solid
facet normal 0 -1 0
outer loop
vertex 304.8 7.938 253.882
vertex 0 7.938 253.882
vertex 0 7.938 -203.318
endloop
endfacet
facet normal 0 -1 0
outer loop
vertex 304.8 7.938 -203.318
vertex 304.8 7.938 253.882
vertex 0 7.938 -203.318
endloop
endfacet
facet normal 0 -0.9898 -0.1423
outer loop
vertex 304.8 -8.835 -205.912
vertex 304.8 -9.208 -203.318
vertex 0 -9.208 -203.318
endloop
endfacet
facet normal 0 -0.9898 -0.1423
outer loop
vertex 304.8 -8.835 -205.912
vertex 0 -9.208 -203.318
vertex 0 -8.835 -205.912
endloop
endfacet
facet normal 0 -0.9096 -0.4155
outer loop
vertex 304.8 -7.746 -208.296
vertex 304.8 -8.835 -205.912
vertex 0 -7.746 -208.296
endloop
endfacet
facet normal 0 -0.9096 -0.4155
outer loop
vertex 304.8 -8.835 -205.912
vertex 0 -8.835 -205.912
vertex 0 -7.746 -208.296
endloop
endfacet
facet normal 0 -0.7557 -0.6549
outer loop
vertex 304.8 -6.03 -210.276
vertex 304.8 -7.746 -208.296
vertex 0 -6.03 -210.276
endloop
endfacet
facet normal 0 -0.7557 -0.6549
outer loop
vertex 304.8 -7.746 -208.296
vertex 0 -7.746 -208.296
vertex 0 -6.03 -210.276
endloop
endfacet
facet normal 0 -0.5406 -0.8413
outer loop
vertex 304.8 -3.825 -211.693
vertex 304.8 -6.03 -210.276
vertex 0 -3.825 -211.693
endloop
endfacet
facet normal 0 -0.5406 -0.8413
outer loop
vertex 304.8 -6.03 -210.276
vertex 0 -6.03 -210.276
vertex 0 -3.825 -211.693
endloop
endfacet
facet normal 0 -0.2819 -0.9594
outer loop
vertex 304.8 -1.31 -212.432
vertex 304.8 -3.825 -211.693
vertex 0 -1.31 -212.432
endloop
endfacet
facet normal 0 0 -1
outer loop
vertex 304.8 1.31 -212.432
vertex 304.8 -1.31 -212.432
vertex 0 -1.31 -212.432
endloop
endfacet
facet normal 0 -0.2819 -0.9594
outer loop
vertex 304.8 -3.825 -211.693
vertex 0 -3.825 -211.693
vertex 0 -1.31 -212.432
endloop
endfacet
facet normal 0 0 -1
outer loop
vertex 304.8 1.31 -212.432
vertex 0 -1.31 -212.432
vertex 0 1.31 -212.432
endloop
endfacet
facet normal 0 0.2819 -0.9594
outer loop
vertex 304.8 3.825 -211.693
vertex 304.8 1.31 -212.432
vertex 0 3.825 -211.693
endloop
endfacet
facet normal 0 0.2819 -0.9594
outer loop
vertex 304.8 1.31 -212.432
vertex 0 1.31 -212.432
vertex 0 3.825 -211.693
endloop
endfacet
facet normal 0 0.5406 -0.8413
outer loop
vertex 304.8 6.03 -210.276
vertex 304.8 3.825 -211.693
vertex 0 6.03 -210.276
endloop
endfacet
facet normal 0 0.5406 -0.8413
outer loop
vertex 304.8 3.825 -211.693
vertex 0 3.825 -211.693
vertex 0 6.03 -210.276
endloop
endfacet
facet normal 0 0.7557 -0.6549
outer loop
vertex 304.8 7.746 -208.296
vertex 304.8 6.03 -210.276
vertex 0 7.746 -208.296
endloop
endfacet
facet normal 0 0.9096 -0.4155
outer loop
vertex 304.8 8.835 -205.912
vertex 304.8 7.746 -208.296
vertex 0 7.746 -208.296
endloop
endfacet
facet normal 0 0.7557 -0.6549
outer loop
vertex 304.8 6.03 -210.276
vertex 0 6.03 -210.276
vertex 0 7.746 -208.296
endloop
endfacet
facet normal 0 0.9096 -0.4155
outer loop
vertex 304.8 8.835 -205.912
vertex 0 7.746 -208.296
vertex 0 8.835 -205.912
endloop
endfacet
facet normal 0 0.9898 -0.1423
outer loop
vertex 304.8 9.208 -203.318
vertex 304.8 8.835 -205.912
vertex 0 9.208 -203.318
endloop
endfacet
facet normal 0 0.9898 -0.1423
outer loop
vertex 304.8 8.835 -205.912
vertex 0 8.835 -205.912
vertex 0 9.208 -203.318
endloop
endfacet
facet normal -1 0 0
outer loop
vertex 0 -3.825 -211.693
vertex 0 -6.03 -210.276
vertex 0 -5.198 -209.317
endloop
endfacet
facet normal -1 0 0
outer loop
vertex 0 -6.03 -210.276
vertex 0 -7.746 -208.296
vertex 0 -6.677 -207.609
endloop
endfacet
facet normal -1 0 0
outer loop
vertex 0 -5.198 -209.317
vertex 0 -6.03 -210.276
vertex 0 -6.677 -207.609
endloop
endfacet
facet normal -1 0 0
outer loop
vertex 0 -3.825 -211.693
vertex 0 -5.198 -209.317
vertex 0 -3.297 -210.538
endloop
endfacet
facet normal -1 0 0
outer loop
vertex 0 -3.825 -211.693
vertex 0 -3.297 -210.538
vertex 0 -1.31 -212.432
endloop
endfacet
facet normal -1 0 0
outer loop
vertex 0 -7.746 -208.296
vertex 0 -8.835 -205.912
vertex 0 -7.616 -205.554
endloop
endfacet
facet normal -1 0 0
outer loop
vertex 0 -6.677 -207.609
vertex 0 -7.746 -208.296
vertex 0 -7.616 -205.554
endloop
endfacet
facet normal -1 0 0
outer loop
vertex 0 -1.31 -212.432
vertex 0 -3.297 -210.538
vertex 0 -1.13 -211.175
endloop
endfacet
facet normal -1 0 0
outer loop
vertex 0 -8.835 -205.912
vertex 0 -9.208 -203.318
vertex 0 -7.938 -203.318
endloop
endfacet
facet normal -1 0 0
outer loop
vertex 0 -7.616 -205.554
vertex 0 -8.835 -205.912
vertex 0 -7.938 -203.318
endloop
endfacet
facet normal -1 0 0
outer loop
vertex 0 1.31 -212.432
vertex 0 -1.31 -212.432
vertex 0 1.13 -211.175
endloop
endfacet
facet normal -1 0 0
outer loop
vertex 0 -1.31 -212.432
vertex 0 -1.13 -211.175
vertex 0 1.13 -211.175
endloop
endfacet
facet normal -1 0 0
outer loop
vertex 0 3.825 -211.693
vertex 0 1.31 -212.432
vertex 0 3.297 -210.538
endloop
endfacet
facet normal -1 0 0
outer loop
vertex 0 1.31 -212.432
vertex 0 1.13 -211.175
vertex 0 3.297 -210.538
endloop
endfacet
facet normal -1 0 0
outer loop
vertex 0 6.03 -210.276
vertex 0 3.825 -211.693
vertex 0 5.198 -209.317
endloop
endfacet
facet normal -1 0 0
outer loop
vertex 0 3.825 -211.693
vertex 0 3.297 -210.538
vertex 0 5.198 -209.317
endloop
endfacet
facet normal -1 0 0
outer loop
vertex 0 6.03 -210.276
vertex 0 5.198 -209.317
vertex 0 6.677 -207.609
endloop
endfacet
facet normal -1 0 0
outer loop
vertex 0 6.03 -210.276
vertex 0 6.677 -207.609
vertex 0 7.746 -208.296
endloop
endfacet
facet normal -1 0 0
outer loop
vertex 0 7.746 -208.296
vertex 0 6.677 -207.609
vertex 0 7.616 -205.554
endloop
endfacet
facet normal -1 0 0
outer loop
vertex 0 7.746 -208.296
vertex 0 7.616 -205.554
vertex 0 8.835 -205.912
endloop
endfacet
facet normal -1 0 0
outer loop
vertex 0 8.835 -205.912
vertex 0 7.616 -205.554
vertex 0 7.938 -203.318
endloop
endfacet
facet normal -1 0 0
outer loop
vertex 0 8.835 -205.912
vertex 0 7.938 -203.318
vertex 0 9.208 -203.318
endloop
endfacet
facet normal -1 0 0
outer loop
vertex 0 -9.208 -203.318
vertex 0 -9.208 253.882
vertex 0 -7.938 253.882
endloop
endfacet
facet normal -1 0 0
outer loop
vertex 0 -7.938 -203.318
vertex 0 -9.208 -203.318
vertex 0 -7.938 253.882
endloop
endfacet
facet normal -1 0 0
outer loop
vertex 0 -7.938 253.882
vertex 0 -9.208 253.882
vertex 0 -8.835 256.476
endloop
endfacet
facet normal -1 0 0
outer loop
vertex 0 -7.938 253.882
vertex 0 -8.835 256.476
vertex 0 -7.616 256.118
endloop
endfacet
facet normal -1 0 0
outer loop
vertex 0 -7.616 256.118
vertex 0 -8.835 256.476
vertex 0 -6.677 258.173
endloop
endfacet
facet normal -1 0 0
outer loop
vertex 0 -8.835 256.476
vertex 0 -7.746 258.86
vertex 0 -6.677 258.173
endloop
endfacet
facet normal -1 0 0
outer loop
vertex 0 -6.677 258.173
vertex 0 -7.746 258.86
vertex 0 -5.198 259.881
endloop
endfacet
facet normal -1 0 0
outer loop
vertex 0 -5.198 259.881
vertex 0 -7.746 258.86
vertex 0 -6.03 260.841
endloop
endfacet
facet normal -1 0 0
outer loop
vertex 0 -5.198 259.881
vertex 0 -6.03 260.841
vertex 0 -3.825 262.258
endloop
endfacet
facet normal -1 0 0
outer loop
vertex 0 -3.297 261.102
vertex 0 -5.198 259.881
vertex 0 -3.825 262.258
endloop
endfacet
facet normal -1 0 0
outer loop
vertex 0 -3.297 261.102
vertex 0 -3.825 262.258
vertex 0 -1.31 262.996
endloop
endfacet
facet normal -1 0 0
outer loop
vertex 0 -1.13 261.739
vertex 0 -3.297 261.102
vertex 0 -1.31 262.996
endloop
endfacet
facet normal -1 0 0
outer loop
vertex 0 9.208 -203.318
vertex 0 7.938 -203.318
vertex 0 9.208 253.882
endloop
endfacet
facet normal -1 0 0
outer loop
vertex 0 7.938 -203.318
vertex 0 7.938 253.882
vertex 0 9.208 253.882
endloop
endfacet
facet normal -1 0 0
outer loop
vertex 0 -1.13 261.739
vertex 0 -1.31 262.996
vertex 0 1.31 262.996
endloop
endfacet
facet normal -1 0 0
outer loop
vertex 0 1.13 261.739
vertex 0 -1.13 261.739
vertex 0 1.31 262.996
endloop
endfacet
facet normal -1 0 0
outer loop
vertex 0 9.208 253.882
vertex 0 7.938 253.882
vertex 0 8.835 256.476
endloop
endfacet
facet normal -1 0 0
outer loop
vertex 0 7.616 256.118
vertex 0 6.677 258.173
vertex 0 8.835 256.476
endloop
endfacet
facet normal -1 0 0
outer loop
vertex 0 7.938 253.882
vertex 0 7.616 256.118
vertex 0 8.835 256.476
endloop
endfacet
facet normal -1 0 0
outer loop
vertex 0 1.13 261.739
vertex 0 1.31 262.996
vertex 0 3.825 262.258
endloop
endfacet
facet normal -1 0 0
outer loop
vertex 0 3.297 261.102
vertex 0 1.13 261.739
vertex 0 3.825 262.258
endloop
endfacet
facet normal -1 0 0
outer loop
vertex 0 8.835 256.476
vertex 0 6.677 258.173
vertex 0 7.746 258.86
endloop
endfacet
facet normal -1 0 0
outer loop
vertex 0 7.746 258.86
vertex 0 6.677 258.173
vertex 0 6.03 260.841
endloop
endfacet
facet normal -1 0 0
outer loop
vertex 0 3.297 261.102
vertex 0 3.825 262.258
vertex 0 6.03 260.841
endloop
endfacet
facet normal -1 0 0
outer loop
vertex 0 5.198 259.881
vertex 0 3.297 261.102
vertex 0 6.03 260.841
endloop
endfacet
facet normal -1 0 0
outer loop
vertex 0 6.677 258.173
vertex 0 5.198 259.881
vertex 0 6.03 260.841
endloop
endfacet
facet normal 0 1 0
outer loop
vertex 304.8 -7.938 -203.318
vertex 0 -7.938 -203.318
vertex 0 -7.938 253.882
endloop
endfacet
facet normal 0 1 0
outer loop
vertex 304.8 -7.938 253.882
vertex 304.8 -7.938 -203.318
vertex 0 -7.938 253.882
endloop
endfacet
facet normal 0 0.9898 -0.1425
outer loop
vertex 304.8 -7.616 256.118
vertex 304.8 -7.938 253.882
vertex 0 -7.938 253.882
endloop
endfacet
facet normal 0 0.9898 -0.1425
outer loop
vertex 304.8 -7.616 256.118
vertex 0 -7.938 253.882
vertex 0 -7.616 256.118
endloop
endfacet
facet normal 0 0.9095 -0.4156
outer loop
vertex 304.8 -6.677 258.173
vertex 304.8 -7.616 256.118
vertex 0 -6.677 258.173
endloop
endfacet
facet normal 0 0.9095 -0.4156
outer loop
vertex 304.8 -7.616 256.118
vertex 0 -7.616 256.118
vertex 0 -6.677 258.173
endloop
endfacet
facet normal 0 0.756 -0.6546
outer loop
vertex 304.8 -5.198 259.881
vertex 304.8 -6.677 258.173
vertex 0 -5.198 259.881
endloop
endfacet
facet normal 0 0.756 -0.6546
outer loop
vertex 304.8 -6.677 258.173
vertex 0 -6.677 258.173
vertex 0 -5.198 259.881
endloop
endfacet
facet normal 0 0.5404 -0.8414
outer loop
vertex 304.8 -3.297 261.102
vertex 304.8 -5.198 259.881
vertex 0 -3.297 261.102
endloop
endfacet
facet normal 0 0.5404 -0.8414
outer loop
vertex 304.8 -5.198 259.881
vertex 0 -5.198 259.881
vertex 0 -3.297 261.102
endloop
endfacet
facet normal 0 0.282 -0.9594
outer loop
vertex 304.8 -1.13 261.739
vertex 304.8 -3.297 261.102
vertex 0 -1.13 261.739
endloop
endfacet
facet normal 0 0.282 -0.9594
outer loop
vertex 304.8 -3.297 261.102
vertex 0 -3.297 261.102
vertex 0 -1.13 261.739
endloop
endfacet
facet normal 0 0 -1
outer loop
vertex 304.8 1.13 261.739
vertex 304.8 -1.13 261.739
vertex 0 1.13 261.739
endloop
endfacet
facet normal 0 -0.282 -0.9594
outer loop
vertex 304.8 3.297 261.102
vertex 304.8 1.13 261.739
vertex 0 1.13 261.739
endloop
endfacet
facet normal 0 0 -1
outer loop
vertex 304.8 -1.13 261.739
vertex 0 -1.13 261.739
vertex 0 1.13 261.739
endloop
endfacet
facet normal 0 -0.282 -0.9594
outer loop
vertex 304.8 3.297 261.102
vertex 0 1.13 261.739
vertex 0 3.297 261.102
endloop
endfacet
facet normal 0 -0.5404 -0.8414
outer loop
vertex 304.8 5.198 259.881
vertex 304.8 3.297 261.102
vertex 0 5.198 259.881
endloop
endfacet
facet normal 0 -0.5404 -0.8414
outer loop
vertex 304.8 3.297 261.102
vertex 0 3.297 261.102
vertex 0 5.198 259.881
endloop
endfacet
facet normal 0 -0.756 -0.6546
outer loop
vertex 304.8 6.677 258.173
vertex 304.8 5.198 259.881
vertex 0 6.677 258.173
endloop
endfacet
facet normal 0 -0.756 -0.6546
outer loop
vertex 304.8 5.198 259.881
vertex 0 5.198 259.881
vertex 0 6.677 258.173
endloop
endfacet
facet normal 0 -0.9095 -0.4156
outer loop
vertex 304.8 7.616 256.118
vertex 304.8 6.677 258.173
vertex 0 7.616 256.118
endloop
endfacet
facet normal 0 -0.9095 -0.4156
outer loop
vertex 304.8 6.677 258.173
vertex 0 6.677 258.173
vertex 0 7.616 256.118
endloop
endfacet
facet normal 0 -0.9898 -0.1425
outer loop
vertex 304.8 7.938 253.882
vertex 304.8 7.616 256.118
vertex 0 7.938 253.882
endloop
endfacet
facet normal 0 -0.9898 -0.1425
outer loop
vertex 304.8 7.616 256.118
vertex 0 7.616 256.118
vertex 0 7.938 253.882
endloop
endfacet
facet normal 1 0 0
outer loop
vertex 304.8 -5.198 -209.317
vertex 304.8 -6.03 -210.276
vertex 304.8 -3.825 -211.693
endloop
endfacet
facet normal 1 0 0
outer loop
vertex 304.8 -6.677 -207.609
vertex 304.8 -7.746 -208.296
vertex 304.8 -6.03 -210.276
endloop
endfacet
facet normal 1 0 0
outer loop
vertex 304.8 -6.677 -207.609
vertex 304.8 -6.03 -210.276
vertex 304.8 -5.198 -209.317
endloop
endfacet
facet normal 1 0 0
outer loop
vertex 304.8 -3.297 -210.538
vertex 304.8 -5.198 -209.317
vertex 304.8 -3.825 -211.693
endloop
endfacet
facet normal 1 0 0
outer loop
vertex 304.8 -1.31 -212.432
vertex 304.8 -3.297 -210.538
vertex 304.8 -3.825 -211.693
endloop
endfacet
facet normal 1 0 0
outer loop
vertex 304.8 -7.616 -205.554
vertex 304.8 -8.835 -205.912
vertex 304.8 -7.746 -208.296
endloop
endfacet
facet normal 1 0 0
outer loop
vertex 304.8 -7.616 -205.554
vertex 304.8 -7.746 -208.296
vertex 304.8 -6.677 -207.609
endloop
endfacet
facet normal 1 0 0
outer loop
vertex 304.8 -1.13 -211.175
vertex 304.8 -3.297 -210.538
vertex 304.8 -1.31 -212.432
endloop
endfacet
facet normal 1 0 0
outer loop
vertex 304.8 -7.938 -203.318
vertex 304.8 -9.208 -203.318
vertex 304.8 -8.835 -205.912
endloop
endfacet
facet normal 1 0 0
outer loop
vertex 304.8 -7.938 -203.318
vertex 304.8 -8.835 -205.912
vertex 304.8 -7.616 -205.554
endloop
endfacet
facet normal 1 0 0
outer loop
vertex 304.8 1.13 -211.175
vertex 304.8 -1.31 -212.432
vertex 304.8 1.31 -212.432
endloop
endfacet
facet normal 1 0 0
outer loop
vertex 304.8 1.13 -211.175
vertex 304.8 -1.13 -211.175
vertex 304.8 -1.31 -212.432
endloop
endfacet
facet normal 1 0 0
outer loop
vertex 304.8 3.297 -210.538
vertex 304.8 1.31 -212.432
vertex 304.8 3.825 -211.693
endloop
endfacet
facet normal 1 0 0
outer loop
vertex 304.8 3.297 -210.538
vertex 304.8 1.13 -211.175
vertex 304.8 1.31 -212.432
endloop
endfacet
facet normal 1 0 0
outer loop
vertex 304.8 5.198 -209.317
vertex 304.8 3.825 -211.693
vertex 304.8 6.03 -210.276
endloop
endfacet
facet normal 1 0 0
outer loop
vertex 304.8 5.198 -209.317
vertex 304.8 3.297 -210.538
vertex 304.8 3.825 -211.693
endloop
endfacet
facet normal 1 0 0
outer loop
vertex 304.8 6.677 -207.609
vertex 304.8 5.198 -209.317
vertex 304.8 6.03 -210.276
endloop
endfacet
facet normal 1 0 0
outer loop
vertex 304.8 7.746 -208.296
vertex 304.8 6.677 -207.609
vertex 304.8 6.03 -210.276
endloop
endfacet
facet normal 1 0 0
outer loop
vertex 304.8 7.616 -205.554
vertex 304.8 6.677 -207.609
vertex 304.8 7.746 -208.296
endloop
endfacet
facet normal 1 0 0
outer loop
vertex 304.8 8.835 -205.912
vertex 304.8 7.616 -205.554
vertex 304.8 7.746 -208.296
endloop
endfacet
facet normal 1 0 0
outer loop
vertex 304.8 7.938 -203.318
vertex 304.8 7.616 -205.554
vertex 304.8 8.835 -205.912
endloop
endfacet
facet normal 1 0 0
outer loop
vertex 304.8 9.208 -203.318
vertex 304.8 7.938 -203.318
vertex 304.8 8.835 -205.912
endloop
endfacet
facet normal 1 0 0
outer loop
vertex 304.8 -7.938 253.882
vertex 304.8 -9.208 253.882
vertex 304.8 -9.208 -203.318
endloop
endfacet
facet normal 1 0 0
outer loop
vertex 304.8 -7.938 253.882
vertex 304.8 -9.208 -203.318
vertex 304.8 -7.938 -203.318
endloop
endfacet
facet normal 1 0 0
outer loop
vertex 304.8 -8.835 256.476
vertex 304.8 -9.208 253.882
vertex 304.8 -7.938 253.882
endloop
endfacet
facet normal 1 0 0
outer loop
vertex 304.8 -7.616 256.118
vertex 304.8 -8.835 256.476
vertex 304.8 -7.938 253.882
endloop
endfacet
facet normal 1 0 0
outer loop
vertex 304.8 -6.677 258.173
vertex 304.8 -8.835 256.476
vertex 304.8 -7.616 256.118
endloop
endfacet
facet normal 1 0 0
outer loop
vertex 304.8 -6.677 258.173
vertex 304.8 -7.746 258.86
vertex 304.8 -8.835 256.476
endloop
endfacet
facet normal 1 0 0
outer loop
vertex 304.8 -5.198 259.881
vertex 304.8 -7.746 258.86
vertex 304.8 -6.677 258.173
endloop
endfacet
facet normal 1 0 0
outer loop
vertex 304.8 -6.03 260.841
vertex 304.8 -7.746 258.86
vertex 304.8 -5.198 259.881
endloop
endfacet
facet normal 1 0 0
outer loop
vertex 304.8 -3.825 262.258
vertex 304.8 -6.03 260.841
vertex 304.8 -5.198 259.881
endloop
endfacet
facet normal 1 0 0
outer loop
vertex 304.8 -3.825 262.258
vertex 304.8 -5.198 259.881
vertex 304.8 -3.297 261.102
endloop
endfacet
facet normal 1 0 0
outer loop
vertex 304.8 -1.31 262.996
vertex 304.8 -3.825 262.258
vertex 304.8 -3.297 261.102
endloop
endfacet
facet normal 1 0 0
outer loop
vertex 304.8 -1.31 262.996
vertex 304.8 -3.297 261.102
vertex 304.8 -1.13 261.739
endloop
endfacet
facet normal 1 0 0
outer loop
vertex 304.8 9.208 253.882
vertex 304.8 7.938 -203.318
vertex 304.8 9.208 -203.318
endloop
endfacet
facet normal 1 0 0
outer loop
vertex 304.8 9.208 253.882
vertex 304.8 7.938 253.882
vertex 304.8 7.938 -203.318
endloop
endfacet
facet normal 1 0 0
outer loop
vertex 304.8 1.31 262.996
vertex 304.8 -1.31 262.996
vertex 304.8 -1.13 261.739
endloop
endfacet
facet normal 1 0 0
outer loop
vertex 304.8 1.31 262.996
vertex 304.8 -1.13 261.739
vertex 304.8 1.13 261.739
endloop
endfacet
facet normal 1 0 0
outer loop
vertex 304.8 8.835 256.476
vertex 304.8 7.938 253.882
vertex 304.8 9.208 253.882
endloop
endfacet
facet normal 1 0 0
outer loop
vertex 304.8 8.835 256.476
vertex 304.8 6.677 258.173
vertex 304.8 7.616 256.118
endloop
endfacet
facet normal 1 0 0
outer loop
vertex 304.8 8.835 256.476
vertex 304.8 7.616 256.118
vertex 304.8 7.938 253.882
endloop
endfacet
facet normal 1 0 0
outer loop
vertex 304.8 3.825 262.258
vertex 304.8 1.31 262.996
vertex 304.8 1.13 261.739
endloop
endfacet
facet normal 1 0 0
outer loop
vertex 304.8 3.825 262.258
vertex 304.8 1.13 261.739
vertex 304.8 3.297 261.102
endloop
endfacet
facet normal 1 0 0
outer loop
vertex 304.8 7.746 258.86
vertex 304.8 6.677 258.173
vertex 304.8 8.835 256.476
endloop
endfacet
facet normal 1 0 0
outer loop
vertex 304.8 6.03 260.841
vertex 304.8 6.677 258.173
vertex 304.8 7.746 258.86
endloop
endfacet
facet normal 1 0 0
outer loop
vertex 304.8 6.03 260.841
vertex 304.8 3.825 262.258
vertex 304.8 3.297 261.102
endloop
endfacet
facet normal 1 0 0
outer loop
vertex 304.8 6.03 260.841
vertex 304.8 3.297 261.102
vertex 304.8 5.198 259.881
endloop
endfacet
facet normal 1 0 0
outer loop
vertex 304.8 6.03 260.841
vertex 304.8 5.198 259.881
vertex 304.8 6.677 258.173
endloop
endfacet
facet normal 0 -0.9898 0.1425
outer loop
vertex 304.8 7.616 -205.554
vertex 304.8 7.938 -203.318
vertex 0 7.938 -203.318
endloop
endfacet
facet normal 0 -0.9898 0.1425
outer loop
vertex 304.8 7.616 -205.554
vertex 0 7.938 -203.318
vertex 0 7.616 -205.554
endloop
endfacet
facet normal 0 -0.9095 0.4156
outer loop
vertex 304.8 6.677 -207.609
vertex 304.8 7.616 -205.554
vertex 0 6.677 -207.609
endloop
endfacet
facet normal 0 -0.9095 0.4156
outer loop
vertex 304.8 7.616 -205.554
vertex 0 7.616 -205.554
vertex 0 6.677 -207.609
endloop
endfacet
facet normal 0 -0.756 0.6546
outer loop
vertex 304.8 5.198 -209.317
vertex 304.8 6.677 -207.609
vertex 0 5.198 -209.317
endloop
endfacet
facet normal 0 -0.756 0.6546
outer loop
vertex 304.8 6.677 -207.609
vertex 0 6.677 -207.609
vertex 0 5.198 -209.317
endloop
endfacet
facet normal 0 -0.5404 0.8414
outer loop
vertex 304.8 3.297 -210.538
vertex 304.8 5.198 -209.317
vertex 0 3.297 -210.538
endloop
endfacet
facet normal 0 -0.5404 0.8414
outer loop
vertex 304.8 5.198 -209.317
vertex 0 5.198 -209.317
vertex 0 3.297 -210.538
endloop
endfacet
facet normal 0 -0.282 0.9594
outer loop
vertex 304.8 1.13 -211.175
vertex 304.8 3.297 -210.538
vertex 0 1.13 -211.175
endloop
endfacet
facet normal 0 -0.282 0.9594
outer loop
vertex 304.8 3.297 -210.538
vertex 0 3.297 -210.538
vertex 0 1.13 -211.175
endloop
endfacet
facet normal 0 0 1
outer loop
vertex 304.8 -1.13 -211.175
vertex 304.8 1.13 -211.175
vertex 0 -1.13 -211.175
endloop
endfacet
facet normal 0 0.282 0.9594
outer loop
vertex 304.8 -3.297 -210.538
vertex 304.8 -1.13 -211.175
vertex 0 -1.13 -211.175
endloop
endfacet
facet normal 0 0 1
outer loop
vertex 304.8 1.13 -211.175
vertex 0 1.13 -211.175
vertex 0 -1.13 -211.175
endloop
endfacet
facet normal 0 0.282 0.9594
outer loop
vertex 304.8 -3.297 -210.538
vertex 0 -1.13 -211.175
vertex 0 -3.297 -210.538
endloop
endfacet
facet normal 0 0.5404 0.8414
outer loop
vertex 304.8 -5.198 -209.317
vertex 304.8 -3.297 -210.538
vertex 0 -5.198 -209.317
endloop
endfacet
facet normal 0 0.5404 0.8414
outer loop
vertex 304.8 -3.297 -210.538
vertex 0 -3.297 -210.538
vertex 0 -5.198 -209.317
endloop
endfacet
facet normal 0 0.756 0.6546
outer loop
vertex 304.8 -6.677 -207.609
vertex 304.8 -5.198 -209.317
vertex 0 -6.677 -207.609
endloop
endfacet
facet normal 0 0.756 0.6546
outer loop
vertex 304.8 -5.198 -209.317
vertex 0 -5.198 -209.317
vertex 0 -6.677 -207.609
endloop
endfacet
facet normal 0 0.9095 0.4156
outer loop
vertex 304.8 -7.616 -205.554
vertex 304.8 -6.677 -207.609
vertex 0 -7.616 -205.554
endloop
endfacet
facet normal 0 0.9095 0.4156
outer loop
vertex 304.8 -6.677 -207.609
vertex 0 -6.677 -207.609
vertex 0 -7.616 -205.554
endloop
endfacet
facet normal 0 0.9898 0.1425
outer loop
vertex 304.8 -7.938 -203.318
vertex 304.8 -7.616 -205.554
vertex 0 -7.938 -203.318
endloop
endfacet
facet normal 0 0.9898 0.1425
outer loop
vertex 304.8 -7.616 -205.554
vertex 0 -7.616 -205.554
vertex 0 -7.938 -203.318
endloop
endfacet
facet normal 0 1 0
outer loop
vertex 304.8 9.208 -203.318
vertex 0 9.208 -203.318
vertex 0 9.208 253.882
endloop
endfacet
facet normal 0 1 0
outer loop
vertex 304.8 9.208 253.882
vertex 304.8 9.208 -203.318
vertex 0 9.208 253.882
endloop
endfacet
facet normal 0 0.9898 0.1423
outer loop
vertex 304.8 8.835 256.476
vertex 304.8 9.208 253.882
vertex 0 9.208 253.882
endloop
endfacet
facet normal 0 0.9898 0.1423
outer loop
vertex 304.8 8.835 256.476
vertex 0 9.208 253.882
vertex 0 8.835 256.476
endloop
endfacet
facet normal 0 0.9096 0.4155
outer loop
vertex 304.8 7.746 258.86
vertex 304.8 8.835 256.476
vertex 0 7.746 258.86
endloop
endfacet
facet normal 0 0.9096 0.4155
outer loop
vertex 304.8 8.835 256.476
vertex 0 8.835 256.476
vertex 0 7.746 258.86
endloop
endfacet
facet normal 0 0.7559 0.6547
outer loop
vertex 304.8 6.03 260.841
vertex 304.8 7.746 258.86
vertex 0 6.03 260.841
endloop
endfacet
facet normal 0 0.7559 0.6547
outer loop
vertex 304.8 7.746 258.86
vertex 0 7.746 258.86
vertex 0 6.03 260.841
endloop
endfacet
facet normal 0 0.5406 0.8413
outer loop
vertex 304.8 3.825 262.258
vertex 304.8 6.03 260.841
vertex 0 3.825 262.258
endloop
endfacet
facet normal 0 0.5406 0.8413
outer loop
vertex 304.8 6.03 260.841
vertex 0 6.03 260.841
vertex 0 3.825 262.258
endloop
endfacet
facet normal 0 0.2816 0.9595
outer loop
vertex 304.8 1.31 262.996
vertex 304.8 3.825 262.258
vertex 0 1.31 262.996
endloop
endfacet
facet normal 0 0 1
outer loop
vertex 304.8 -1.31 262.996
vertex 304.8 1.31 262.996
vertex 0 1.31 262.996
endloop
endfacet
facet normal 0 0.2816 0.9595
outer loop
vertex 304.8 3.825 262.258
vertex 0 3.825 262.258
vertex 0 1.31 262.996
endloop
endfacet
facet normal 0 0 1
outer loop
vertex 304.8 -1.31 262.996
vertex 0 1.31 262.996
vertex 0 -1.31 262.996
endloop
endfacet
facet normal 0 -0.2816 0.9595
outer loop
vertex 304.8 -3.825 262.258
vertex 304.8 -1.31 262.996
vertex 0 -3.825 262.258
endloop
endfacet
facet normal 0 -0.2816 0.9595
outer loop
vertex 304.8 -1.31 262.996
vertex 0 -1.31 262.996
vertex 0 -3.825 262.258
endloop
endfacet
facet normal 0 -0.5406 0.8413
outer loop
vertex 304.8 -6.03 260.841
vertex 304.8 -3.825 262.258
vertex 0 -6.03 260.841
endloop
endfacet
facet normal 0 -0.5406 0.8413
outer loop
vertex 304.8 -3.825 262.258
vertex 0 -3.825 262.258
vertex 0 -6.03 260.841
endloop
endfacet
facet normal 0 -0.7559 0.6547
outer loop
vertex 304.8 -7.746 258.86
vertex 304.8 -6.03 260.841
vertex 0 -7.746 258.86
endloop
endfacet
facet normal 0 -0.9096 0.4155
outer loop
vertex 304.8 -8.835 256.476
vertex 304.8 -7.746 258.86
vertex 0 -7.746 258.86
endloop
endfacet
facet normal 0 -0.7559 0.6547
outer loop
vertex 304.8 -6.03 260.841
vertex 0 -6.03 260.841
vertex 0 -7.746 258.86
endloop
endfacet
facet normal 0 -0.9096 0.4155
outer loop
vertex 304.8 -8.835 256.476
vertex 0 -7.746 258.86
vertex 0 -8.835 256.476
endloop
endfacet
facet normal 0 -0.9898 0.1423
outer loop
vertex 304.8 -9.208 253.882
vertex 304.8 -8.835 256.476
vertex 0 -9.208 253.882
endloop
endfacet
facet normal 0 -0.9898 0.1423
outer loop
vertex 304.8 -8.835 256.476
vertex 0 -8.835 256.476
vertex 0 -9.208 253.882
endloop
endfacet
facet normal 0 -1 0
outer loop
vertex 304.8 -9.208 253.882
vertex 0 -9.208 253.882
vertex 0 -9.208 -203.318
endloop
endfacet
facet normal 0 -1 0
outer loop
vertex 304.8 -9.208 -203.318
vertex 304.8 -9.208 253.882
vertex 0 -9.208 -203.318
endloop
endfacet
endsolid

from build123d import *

# Parameters (mm, degrees)
F1_DEPTH = 304.8


with BuildPart() as f1:
    # F0 (on Right) → F1 (new body)
    with BuildSketch(Plane.YZ):
        with BuildLine():
            ThreePointArc((9.2075, 253.882135), (0, 263.089635), (-9.2075, 253.882135))
            Line((-9.2075, 253.882135), (-9.2075, -203.317865))
            ThreePointArc((-9.2075, -203.317865), (0, -212.525365), (9.2075, -203.317865))
            Line((9.2075, -203.317865), (9.2075, 253.882135))
        make_face()
        with BuildLine():
            ThreePointArc((-7.9375, 253.882135), (0, 261.819635), (7.9375, 253.882135))
            Line((7.9375, 253.882135), (7.9375, -203.317865))
            ThreePointArc((7.9375, -203.317865), (0, -211.255365), (-7.9375, -203.317865))
            Line((-7.9375, -203.317865), (-7.9375, 253.882135))
        make_face(mode=Mode.SUBTRACT)
    extrude(amount=F1_DEPTH)


solid = f1.part
